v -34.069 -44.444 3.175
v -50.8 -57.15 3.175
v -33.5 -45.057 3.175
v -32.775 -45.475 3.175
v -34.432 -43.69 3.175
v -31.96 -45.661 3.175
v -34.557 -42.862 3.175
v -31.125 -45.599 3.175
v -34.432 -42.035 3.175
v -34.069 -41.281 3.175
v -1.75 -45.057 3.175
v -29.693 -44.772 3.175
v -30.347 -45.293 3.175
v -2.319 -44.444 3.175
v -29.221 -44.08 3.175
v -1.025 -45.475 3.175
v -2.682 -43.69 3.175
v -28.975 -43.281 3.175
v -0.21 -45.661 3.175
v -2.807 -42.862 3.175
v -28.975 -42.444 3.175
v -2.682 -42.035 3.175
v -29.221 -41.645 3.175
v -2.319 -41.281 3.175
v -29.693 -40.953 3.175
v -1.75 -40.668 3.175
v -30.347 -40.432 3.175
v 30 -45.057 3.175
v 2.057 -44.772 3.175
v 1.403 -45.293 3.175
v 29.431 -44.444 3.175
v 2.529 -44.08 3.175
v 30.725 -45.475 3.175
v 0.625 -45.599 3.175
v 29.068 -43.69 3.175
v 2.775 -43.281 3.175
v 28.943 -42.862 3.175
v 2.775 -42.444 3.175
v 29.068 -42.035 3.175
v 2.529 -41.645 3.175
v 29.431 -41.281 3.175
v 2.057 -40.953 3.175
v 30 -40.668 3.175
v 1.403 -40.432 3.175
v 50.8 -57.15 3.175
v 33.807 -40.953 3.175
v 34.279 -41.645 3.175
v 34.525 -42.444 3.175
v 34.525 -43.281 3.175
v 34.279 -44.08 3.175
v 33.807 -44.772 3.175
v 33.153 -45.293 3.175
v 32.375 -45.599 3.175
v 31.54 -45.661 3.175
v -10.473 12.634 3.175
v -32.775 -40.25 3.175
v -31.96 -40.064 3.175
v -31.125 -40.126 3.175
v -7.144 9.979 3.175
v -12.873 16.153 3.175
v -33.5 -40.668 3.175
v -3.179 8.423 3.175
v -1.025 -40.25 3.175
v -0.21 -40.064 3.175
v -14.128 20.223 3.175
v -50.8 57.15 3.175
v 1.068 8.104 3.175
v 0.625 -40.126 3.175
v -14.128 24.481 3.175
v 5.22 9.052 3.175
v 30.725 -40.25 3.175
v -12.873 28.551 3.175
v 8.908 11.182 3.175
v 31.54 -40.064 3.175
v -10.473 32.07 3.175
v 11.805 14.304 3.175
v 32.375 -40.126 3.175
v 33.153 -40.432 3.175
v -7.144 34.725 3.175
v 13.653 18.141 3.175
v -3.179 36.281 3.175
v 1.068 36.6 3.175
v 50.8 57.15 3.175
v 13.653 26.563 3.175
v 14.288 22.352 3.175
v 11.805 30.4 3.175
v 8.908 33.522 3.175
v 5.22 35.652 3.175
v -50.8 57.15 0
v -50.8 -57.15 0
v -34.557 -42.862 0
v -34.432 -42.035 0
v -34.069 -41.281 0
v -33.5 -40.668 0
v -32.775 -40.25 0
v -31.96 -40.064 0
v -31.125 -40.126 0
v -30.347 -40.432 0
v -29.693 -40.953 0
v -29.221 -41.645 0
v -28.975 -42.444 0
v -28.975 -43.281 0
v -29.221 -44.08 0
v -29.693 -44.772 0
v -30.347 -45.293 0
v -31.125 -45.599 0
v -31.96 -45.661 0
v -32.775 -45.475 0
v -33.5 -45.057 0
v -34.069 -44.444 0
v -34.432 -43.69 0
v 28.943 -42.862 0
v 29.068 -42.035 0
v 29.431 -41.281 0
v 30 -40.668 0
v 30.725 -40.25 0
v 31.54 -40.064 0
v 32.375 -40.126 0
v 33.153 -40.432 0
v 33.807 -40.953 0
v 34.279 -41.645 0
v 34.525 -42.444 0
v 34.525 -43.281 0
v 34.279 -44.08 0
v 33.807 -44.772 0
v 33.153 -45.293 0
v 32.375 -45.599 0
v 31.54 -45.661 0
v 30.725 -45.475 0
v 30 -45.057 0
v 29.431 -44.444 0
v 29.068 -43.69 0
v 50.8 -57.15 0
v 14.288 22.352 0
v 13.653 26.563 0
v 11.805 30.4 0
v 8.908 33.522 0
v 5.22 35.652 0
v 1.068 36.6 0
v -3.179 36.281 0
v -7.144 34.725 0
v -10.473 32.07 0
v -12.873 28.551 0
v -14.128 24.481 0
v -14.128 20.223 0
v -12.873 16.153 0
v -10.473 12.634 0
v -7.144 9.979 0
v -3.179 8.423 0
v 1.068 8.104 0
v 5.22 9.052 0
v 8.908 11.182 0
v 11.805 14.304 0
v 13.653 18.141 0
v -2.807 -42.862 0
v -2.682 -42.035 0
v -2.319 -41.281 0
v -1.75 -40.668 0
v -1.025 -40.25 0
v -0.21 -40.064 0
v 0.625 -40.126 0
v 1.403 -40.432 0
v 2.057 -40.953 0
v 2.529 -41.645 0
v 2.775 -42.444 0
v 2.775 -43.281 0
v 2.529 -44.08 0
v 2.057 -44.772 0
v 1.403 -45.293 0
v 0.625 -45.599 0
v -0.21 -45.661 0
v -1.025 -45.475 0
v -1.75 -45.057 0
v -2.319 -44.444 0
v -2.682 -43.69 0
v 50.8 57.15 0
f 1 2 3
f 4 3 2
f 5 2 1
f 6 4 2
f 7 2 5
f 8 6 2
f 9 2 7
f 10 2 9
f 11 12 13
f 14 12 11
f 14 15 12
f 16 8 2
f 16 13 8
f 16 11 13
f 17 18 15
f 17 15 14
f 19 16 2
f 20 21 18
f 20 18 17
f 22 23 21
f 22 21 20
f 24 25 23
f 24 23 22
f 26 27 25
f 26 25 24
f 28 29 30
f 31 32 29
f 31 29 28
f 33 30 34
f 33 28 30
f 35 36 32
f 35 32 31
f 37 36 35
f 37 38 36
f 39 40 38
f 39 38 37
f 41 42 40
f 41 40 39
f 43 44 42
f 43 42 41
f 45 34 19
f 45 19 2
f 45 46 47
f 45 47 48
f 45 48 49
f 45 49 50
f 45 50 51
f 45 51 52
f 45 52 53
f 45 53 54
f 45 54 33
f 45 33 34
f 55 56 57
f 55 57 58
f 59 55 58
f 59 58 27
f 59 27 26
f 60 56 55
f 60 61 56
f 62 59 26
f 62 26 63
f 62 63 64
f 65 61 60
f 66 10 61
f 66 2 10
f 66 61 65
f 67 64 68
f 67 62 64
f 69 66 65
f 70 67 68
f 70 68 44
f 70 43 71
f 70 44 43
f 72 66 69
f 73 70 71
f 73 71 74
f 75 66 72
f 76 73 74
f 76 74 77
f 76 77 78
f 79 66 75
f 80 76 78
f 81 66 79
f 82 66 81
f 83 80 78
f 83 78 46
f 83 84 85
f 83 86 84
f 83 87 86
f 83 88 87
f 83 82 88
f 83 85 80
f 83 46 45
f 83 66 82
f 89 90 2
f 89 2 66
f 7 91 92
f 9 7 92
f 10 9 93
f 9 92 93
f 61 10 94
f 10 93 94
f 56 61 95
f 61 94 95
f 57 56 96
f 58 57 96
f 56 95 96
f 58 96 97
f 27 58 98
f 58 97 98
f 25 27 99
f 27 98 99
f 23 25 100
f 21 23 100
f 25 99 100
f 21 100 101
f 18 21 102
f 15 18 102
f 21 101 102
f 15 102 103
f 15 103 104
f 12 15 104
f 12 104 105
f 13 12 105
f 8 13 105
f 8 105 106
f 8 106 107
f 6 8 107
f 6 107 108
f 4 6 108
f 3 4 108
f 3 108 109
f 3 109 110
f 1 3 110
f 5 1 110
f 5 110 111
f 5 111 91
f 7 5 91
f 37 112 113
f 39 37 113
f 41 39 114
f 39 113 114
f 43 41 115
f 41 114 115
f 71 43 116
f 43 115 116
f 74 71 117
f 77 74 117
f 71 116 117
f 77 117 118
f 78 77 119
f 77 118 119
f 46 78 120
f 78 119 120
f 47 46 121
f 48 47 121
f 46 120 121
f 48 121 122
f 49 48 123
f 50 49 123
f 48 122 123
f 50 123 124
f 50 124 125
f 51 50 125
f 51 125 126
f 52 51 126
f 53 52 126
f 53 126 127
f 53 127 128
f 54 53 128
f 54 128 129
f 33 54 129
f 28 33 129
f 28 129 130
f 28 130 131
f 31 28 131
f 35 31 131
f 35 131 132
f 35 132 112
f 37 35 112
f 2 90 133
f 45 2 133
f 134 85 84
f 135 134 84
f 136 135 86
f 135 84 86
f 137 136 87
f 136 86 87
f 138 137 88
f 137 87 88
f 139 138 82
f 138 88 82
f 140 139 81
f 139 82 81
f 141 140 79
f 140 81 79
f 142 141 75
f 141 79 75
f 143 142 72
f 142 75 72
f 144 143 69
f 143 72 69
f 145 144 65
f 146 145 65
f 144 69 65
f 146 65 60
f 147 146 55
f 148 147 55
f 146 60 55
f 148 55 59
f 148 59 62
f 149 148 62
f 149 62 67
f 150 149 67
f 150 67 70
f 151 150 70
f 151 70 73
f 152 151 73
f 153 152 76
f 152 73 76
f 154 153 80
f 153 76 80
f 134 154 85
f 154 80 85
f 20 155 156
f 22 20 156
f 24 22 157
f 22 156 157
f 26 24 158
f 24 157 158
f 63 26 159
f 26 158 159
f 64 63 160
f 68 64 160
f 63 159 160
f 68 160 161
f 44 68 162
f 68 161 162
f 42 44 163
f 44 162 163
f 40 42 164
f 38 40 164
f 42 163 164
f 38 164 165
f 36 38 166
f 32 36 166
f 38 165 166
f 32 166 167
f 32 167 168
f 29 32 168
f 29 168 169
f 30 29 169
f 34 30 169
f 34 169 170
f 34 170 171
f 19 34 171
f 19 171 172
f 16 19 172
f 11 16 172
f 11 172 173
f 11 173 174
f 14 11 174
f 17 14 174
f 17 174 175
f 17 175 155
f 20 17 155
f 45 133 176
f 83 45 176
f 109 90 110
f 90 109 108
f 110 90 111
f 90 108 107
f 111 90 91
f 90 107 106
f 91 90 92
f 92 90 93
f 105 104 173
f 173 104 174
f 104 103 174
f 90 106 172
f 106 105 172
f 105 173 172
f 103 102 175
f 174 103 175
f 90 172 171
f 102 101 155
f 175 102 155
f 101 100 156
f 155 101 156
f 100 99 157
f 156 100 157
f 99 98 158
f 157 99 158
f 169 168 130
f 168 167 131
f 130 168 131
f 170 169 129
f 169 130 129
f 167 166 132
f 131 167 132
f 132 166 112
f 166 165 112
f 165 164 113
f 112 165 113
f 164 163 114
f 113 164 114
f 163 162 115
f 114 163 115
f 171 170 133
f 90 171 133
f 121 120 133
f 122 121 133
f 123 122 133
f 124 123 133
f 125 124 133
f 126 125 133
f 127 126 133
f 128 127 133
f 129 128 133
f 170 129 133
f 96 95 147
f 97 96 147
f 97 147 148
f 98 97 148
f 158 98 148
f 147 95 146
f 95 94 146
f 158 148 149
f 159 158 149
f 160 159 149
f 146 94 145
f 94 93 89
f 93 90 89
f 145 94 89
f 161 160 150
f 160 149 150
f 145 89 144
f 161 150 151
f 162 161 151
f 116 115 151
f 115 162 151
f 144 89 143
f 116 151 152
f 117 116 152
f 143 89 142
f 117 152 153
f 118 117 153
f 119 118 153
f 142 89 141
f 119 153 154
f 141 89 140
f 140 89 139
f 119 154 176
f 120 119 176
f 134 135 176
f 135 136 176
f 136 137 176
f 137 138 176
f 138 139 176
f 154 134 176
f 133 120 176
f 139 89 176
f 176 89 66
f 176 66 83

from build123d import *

# Parameters (mm, degrees)
SKETCH1_W              = 101.6
SKETCH1_H              = 114.3
BOSS_EXTRUDE1_DEPTH    = 3.175
SKETCH2_R              = 14.2875
CUT_EXTRUDE1_DEPTH     = 3.175
F_10_CLEARANCE_HOLE1_D = 5.6134


with BuildPart() as part:
    # Sketch1 → Boss-Extrude1 (new body)
    with BuildSketch(Plane.XY):
        Rectangle(SKETCH1_W, SKETCH1_H)
    extrude(amount=BOSS_EXTRUDE1_DEPTH)

    # Sketch2 → Cut-Extrude1 (cut)
    with BuildSketch(Plane.XY.offset(3.175)):
        with Locations((0, 22.352)):
            Circle(SKETCH2_R)
    extrude(amount=-CUT_EXTRUDE1_DEPTH, mode=Mode.SUBTRACT)

    # #10 Clearance Hole1 (through all)
    with Locations(Plane.XY.offset(3.175)):
        with Locations((-31.75, -42.8625), (0, -42.8625), (31.75, -42.8625)):
            Hole(F_10_CLEARANCE_HOLE1_D / 2)


solid = part.part
